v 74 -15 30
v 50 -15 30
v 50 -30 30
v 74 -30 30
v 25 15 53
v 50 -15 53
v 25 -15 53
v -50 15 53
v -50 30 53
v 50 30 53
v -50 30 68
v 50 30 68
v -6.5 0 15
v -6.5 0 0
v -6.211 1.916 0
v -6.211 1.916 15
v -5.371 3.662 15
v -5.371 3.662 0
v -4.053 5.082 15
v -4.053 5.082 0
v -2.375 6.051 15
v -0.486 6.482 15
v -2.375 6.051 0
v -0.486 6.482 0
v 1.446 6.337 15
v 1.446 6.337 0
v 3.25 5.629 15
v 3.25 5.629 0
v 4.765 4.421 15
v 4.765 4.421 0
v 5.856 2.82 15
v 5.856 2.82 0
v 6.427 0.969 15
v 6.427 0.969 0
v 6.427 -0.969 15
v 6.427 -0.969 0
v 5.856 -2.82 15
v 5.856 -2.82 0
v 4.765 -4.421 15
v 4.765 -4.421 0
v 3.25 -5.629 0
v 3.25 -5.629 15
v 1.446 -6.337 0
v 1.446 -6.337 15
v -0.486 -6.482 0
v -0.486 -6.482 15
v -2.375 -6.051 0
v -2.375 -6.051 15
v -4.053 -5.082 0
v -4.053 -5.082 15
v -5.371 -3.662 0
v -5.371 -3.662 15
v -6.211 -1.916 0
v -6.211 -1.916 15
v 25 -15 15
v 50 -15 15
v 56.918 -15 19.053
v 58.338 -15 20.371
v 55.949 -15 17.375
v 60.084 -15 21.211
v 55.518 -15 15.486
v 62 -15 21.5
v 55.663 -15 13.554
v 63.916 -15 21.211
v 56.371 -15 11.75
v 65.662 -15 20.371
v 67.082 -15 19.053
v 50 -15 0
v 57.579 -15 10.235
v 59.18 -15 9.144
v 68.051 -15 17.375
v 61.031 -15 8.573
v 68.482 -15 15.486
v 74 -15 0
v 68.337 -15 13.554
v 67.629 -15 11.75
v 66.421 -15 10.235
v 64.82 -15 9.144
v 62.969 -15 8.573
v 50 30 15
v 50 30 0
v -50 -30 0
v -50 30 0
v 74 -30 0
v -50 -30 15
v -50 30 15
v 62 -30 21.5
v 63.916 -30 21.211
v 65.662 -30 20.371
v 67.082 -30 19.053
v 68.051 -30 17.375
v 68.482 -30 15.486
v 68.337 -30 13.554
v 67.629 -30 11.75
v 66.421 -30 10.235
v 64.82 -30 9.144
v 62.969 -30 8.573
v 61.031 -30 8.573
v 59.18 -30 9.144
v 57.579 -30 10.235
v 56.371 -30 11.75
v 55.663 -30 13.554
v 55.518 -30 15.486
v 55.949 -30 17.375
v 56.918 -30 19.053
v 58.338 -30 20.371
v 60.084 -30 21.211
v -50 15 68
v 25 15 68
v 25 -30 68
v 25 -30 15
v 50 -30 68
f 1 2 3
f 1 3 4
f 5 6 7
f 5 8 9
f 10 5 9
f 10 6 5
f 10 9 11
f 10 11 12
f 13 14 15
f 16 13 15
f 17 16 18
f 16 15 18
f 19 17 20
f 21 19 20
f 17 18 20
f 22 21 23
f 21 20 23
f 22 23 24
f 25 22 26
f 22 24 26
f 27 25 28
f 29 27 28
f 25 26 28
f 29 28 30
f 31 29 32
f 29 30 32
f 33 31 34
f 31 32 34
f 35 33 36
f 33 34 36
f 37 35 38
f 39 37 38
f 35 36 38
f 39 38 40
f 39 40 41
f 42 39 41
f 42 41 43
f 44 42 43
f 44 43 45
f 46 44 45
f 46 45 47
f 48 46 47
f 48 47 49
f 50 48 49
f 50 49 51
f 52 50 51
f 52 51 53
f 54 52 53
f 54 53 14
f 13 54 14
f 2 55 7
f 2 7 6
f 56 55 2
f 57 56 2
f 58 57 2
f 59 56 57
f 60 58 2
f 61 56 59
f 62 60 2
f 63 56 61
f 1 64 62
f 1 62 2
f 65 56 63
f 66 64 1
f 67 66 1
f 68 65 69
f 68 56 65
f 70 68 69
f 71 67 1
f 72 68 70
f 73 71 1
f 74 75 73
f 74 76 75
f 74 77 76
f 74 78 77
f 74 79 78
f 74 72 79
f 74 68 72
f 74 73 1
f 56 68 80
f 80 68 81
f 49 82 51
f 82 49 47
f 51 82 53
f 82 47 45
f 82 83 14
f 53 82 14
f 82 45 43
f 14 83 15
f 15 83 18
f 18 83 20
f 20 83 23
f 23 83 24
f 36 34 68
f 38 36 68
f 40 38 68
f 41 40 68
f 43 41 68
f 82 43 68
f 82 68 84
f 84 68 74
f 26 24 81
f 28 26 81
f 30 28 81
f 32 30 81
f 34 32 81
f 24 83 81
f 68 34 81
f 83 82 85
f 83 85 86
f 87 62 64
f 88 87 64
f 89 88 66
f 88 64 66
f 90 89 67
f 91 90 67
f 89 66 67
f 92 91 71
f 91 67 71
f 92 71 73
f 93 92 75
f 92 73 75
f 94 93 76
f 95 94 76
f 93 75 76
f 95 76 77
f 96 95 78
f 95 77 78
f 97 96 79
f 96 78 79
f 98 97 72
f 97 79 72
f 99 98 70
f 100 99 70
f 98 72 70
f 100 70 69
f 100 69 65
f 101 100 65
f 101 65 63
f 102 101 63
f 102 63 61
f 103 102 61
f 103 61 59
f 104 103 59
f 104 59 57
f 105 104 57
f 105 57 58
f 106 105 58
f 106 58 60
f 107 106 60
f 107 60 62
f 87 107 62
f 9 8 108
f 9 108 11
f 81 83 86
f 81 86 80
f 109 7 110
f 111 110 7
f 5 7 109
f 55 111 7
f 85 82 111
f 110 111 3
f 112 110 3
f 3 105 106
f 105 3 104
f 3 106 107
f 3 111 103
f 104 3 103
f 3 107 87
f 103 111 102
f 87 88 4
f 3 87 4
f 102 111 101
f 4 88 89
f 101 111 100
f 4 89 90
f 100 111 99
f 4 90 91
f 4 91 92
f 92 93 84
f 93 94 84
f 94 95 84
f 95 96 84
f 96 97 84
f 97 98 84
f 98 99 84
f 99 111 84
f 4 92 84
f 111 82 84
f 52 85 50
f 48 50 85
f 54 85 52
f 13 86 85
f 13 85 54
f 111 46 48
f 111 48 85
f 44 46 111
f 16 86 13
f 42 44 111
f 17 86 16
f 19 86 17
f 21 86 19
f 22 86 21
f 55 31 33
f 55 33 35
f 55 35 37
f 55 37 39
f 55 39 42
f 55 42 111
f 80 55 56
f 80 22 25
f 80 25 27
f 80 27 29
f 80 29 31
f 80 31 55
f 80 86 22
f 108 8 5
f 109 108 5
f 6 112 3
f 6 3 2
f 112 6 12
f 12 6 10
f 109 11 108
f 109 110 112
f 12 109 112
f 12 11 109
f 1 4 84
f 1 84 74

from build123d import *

# Parameters (mm, degrees)
BOSS_EXTRUDE1_DEPTH     = 68
SKETCH1_3_W             = 24
SKETCH1_3_H             = 15
BOSS_EXTRUDE2_DEPTH     = 30
SKETCH2_R               = 6.5
CUT_EXTRUDE1_DEPTH      = 40
SKETCH3_W               = 38
SKETCH3_H               = 45
CUT_EXTRUDE2_DEPTH      = 113
CUT_EXTRUDE3_DEPTH      = 105.880884817
CUT_EXTRUDE3_DEPTH_BACK = 53
SKETCH4_W               = 75
SKETCH4_H               = 45
SKETCH5_R               = 6.5
CUT_EXTRUDE4_DEPTH      = 38


with BuildPart() as part:
    # Sketch1 → Boss-Extrude1 (new body)
    with BuildSketch(Plane.XY):
        Polygon((-50, -30), (50, -30), (50, -15), (50, 30), (-50, 30), align=None)
    extrude(amount=BOSS_EXTRUDE1_DEPTH)

    # Sketch1<3> → Boss-Extrude2 (add)
    with BuildSketch(Plane.XY):
        with Locations((62, -22.5)):
            Rectangle(SKETCH1_3_W, SKETCH1_3_H)
    extrude(amount=BOSS_EXTRUDE2_DEPTH)

    # Sketch2 → Cut-Extrude1 (cut)
    with BuildSketch(Plane(origin=(0, -15, 0), x_dir=(1, 0, 0), z_dir=(0, 1, 0))):
        with Locations((62, -15)):
            Circle(SKETCH2_R)
    extrude(amount=-CUT_EXTRUDE1_DEPTH, mode=Mode.SUBTRACT)

    # Sketch3 → Cut-Extrude2 (cut)
    with BuildSketch(Plane(origin=(50, 0, 0), x_dir=(0, 0, -1), z_dir=(1, 0, 0))):
        with Locations((-34, 7.5)):
            Rectangle(SKETCH3_W, SKETCH3_H)
    extrude(amount=-CUT_EXTRUDE2_DEPTH, mode=Mode.SUBTRACT)

    # Sketch4 → Cut-Extrude3 (cut, two sides: drawn at the far end of the back side and taken through both)
    with BuildSketch(Plane.XY.offset(68).offset(-CUT_EXTRUDE3_DEPTH_BACK)):
        with Locations((-12.5, -7.5)):
            Rectangle(SKETCH4_W, SKETCH4_H)
    extrude(amount=CUT_EXTRUDE3_DEPTH + CUT_EXTRUDE3_DEPTH_BACK, mode=Mode.SUBTRACT)

    # Sketch5 → Cut-Extrude4 (cut)
    with BuildSketch(Plane(origin=(0, 0, 0), x_dir=(-1, 0, 0), z_dir=(0, 0, -1))):
        Circle(SKETCH5_R)
    extrude(amount=-CUT_EXTRUDE4_DEPTH, mode=Mode.SUBTRACT)


solid = part.part
